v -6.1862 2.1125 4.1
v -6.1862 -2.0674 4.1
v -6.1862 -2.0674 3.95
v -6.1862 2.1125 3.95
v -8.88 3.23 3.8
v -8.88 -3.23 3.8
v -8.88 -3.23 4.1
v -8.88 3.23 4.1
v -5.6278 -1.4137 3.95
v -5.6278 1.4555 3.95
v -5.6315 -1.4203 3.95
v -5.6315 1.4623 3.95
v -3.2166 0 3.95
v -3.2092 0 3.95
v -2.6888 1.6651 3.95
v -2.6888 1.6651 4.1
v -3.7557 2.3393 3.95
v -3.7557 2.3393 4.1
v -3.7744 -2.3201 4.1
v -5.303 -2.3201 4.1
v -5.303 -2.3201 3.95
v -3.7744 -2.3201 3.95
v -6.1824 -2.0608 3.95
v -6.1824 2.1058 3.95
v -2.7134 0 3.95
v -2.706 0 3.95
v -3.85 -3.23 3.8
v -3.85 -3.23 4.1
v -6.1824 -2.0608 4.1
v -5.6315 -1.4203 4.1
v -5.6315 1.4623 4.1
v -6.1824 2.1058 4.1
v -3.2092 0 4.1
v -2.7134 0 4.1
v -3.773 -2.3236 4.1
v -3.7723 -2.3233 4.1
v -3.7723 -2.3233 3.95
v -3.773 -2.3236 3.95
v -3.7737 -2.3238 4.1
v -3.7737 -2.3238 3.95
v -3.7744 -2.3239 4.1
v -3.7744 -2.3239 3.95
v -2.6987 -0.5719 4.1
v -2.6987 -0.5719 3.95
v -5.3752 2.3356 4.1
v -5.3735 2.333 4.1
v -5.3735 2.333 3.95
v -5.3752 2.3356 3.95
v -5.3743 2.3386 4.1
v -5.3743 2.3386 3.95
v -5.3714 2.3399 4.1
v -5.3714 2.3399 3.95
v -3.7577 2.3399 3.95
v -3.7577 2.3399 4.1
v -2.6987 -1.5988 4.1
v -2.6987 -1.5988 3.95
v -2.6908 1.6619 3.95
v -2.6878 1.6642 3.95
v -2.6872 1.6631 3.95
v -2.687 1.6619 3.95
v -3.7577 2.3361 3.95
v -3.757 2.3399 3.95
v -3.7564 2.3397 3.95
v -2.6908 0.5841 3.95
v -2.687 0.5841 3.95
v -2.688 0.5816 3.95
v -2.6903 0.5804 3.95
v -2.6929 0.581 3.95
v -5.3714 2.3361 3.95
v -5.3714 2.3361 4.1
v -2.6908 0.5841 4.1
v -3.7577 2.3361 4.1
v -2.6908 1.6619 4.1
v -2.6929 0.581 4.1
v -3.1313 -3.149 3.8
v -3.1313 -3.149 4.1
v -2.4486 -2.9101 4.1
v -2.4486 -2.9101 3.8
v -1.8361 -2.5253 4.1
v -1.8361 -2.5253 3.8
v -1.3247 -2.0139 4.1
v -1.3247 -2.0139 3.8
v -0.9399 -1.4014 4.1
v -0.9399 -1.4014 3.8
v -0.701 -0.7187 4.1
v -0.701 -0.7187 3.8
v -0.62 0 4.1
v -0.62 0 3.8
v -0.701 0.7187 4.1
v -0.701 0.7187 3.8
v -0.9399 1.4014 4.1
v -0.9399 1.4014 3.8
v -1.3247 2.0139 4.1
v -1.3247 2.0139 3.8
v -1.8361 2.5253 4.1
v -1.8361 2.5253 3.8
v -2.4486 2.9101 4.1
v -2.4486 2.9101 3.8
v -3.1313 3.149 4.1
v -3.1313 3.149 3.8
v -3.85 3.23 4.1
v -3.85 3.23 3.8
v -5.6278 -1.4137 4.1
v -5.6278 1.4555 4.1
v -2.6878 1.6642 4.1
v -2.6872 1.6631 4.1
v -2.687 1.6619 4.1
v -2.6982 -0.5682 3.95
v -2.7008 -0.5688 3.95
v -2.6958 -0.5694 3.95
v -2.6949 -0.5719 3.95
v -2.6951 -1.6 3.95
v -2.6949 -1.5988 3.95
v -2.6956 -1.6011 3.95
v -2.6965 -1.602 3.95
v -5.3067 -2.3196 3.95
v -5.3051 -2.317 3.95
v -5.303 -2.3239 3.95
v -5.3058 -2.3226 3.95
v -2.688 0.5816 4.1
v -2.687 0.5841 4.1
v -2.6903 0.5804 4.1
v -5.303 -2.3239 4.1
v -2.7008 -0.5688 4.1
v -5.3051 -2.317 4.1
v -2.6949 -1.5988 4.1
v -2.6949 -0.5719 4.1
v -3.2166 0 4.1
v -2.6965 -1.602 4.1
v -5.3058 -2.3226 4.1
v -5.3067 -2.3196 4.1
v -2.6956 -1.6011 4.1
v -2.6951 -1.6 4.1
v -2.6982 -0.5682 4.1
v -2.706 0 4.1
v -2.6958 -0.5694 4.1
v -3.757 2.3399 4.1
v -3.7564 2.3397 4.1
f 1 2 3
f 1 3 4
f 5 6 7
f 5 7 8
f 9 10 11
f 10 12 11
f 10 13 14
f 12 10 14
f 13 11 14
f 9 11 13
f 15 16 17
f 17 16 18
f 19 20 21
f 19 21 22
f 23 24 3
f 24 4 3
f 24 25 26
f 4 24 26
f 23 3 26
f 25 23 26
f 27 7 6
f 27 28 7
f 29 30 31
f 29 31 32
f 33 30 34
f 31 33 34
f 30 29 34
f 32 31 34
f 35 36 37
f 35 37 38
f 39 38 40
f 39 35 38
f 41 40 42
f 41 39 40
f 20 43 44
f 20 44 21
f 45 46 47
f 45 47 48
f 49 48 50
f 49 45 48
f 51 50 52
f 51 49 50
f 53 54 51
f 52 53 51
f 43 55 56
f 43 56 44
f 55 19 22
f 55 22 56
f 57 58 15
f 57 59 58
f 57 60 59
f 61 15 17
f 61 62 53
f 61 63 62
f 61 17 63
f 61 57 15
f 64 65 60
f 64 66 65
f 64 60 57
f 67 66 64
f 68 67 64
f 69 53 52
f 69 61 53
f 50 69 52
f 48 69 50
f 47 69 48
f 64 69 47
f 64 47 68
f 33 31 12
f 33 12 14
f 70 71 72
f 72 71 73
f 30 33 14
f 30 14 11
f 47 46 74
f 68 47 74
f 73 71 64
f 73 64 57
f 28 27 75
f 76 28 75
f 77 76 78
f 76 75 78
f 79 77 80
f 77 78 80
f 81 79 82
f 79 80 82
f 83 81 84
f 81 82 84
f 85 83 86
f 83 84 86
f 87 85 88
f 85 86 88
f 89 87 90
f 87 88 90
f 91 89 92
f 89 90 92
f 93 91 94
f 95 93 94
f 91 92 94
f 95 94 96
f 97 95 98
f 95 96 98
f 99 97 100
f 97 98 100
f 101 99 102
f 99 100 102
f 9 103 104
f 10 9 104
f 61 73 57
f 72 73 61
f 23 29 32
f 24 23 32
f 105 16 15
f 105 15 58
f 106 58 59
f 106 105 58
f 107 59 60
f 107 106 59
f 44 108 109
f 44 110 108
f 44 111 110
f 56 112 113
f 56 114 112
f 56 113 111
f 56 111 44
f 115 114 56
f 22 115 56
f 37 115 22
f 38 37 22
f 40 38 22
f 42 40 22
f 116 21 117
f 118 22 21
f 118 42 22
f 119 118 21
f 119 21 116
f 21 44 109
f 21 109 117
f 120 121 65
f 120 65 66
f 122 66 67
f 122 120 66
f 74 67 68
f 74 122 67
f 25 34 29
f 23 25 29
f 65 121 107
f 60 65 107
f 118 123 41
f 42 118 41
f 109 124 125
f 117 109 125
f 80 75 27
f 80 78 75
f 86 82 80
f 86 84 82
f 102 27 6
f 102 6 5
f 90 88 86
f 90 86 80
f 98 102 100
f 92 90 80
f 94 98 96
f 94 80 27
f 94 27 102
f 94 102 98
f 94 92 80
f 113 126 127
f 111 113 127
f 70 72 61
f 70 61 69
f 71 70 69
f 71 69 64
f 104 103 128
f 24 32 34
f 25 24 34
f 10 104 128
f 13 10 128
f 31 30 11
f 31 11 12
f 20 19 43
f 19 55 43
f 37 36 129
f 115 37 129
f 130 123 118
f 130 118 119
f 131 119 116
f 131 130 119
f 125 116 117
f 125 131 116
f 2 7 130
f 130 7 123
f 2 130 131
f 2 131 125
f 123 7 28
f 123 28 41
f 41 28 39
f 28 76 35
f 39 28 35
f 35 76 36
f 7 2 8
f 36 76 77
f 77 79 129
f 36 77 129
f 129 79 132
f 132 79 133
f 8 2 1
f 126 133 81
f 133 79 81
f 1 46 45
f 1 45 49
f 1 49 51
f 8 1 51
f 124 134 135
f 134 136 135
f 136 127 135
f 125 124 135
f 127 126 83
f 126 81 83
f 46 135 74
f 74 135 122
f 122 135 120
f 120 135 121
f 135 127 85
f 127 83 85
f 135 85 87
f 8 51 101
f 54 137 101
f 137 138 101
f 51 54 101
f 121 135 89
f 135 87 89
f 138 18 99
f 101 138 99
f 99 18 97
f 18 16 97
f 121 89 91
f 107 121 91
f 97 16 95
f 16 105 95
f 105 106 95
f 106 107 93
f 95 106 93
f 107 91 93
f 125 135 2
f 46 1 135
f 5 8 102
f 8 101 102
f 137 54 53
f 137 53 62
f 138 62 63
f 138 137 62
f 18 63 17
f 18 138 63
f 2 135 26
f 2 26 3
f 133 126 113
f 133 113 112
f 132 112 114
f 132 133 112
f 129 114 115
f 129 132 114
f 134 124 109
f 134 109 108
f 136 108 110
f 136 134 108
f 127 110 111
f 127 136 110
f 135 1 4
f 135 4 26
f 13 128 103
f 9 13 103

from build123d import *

# Parameters (mm, degrees)
PAD007_DEPTH            = 0.3
PAD007_FACE4_W          = 6.46
PAD007_FACE4_H          = 0.3
PAD008_DEPTH            = 2
POCKET026_DEPTH         = 0.15
BODY014_PLACEMENT_ANGLE = 180


with BuildPart() as part:
    # Sketch031 (on Face1 of Binder006) → Pad007 (new body)
    with BuildSketch(Plane.XY.offset(3.8)):
        with BuildLine():
            Line((-5.12, 3.23), (-8.15, 3.23))
            ThreePointArc((-8.15, 3.23), (-11.38, 0), (-8.15, -3.23))
            Line((-5.12, -3.23), (-8.15, -3.23))
            Line((-5.12, 3.23), (-5.12, -3.23))
        make_face()
    extrude(amount=PAD007_DEPTH)

    # Pad007 Face4 → Pad008 (add)
    with BuildSketch(Plane(origin=(-5.12, 0, 3.95), x_dir=(0, -1, 0), z_dir=(1, 0, 0))):
        Rectangle(PAD007_FACE4_W, PAD007_FACE4_H)
    extrude(amount=PAD008_DEPTH)

    # Sketch032 (on Face5 of Pad008) → Pocket026 (cut)
    with BuildSketch(Plane(origin=(-1, 0, 4.1), x_dir=(1, 0, 0), z_dir=(0, 0, 1))):
        Polygon((-4.813813, 2.067422), (-4.813813, -2.112536), (-8.293962, 0), align=None)
        Polygon((-4.817598, -2.10581), (-8.28661, -3.5e-05), (-4.817598, 2.060771), align=None, mode=Mode.SUBTRACT)
        with BuildLine():
            Line((-5.697012, 2.323923), (-7.225571, 2.323923))
            ThreePointArc((-7.227679, 2.323282), (-7.226673, 2.323759), (-7.225571, 2.323923))
            Line((-7.227679, 2.323282), (-8.303458, 1.601963))
            ThreePointArc((-8.305135, 1.598819), (-8.30469, 1.600601), (-8.303458, 1.601963))
            Line((-8.305135, 1.598819), (-8.305135, 0.571915))
            ThreePointArc((-8.29924, 0.568772), (-8.303131, 0.568575), (-8.305135, 0.571915))
            Line((-8.29924, 0.568772), (-5.694902, 2.316995))
            ThreePointArc((-5.697012, 2.323923), (-5.693391, 2.321241), (-5.694902, 2.316995))
        make_face()
        Polygon((-5.697012, 2.320138), (-7.225571, 2.320138), (-8.30135, 1.598819), (-8.30135, 0.571915), align=None, mode=Mode.SUBTRACT)
        with BuildLine():
            Line((-8.312973, -0.584129), (-8.312973, -1.661884))
            ThreePointArc((-8.31121, -1.665084), (-8.312503, -1.663711), (-8.312973, -1.661884))
            Line((-8.31121, -1.665084), (-7.244274, -2.339343))
            ThreePointArc((-7.242252, -2.339928), (-7.243305, -2.339779), (-7.244274, -2.339343))
            Line((-7.242252, -2.339928), (-5.628575, -2.339928))
            ThreePointArc((-5.626504, -2.332975), (-5.624947, -2.337223), (-5.628575, -2.339928))
            Line((-5.626504, -2.332975), (-8.307117, -0.580961))
            ThreePointArc((-8.312973, -0.584129), (-8.310989, -0.5808), (-8.307117, -0.580961))
        make_face()
        Polygon((-8.309188, -0.584129), (-8.309188, -1.661884), (-7.242252, -2.336143), (-5.628575, -2.336143), align=None, mode=Mode.SUBTRACT)
        Polygon((-5.368459, 1.420284), (-5.368459, -1.462254), (-7.790784, 0), align=None)
        Polygon((-5.372244, 1.413677), (-5.372244, -1.455548), (-7.783381, -4.7e-05), align=None, mode=Mode.SUBTRACT)
    extrude(amount=-POCKET026_DEPTH, mode=Mode.SUBTRACT)


with BuildPart() as part_1:
    # Body014 placement: moved
    add(part.part.moved(Location((-12, 0, 0))).rotate(Axis((-12, 0, 0), (0, 0, 1)), BODY014_PLACEMENT_ANGLE))


solid = part_1.part
